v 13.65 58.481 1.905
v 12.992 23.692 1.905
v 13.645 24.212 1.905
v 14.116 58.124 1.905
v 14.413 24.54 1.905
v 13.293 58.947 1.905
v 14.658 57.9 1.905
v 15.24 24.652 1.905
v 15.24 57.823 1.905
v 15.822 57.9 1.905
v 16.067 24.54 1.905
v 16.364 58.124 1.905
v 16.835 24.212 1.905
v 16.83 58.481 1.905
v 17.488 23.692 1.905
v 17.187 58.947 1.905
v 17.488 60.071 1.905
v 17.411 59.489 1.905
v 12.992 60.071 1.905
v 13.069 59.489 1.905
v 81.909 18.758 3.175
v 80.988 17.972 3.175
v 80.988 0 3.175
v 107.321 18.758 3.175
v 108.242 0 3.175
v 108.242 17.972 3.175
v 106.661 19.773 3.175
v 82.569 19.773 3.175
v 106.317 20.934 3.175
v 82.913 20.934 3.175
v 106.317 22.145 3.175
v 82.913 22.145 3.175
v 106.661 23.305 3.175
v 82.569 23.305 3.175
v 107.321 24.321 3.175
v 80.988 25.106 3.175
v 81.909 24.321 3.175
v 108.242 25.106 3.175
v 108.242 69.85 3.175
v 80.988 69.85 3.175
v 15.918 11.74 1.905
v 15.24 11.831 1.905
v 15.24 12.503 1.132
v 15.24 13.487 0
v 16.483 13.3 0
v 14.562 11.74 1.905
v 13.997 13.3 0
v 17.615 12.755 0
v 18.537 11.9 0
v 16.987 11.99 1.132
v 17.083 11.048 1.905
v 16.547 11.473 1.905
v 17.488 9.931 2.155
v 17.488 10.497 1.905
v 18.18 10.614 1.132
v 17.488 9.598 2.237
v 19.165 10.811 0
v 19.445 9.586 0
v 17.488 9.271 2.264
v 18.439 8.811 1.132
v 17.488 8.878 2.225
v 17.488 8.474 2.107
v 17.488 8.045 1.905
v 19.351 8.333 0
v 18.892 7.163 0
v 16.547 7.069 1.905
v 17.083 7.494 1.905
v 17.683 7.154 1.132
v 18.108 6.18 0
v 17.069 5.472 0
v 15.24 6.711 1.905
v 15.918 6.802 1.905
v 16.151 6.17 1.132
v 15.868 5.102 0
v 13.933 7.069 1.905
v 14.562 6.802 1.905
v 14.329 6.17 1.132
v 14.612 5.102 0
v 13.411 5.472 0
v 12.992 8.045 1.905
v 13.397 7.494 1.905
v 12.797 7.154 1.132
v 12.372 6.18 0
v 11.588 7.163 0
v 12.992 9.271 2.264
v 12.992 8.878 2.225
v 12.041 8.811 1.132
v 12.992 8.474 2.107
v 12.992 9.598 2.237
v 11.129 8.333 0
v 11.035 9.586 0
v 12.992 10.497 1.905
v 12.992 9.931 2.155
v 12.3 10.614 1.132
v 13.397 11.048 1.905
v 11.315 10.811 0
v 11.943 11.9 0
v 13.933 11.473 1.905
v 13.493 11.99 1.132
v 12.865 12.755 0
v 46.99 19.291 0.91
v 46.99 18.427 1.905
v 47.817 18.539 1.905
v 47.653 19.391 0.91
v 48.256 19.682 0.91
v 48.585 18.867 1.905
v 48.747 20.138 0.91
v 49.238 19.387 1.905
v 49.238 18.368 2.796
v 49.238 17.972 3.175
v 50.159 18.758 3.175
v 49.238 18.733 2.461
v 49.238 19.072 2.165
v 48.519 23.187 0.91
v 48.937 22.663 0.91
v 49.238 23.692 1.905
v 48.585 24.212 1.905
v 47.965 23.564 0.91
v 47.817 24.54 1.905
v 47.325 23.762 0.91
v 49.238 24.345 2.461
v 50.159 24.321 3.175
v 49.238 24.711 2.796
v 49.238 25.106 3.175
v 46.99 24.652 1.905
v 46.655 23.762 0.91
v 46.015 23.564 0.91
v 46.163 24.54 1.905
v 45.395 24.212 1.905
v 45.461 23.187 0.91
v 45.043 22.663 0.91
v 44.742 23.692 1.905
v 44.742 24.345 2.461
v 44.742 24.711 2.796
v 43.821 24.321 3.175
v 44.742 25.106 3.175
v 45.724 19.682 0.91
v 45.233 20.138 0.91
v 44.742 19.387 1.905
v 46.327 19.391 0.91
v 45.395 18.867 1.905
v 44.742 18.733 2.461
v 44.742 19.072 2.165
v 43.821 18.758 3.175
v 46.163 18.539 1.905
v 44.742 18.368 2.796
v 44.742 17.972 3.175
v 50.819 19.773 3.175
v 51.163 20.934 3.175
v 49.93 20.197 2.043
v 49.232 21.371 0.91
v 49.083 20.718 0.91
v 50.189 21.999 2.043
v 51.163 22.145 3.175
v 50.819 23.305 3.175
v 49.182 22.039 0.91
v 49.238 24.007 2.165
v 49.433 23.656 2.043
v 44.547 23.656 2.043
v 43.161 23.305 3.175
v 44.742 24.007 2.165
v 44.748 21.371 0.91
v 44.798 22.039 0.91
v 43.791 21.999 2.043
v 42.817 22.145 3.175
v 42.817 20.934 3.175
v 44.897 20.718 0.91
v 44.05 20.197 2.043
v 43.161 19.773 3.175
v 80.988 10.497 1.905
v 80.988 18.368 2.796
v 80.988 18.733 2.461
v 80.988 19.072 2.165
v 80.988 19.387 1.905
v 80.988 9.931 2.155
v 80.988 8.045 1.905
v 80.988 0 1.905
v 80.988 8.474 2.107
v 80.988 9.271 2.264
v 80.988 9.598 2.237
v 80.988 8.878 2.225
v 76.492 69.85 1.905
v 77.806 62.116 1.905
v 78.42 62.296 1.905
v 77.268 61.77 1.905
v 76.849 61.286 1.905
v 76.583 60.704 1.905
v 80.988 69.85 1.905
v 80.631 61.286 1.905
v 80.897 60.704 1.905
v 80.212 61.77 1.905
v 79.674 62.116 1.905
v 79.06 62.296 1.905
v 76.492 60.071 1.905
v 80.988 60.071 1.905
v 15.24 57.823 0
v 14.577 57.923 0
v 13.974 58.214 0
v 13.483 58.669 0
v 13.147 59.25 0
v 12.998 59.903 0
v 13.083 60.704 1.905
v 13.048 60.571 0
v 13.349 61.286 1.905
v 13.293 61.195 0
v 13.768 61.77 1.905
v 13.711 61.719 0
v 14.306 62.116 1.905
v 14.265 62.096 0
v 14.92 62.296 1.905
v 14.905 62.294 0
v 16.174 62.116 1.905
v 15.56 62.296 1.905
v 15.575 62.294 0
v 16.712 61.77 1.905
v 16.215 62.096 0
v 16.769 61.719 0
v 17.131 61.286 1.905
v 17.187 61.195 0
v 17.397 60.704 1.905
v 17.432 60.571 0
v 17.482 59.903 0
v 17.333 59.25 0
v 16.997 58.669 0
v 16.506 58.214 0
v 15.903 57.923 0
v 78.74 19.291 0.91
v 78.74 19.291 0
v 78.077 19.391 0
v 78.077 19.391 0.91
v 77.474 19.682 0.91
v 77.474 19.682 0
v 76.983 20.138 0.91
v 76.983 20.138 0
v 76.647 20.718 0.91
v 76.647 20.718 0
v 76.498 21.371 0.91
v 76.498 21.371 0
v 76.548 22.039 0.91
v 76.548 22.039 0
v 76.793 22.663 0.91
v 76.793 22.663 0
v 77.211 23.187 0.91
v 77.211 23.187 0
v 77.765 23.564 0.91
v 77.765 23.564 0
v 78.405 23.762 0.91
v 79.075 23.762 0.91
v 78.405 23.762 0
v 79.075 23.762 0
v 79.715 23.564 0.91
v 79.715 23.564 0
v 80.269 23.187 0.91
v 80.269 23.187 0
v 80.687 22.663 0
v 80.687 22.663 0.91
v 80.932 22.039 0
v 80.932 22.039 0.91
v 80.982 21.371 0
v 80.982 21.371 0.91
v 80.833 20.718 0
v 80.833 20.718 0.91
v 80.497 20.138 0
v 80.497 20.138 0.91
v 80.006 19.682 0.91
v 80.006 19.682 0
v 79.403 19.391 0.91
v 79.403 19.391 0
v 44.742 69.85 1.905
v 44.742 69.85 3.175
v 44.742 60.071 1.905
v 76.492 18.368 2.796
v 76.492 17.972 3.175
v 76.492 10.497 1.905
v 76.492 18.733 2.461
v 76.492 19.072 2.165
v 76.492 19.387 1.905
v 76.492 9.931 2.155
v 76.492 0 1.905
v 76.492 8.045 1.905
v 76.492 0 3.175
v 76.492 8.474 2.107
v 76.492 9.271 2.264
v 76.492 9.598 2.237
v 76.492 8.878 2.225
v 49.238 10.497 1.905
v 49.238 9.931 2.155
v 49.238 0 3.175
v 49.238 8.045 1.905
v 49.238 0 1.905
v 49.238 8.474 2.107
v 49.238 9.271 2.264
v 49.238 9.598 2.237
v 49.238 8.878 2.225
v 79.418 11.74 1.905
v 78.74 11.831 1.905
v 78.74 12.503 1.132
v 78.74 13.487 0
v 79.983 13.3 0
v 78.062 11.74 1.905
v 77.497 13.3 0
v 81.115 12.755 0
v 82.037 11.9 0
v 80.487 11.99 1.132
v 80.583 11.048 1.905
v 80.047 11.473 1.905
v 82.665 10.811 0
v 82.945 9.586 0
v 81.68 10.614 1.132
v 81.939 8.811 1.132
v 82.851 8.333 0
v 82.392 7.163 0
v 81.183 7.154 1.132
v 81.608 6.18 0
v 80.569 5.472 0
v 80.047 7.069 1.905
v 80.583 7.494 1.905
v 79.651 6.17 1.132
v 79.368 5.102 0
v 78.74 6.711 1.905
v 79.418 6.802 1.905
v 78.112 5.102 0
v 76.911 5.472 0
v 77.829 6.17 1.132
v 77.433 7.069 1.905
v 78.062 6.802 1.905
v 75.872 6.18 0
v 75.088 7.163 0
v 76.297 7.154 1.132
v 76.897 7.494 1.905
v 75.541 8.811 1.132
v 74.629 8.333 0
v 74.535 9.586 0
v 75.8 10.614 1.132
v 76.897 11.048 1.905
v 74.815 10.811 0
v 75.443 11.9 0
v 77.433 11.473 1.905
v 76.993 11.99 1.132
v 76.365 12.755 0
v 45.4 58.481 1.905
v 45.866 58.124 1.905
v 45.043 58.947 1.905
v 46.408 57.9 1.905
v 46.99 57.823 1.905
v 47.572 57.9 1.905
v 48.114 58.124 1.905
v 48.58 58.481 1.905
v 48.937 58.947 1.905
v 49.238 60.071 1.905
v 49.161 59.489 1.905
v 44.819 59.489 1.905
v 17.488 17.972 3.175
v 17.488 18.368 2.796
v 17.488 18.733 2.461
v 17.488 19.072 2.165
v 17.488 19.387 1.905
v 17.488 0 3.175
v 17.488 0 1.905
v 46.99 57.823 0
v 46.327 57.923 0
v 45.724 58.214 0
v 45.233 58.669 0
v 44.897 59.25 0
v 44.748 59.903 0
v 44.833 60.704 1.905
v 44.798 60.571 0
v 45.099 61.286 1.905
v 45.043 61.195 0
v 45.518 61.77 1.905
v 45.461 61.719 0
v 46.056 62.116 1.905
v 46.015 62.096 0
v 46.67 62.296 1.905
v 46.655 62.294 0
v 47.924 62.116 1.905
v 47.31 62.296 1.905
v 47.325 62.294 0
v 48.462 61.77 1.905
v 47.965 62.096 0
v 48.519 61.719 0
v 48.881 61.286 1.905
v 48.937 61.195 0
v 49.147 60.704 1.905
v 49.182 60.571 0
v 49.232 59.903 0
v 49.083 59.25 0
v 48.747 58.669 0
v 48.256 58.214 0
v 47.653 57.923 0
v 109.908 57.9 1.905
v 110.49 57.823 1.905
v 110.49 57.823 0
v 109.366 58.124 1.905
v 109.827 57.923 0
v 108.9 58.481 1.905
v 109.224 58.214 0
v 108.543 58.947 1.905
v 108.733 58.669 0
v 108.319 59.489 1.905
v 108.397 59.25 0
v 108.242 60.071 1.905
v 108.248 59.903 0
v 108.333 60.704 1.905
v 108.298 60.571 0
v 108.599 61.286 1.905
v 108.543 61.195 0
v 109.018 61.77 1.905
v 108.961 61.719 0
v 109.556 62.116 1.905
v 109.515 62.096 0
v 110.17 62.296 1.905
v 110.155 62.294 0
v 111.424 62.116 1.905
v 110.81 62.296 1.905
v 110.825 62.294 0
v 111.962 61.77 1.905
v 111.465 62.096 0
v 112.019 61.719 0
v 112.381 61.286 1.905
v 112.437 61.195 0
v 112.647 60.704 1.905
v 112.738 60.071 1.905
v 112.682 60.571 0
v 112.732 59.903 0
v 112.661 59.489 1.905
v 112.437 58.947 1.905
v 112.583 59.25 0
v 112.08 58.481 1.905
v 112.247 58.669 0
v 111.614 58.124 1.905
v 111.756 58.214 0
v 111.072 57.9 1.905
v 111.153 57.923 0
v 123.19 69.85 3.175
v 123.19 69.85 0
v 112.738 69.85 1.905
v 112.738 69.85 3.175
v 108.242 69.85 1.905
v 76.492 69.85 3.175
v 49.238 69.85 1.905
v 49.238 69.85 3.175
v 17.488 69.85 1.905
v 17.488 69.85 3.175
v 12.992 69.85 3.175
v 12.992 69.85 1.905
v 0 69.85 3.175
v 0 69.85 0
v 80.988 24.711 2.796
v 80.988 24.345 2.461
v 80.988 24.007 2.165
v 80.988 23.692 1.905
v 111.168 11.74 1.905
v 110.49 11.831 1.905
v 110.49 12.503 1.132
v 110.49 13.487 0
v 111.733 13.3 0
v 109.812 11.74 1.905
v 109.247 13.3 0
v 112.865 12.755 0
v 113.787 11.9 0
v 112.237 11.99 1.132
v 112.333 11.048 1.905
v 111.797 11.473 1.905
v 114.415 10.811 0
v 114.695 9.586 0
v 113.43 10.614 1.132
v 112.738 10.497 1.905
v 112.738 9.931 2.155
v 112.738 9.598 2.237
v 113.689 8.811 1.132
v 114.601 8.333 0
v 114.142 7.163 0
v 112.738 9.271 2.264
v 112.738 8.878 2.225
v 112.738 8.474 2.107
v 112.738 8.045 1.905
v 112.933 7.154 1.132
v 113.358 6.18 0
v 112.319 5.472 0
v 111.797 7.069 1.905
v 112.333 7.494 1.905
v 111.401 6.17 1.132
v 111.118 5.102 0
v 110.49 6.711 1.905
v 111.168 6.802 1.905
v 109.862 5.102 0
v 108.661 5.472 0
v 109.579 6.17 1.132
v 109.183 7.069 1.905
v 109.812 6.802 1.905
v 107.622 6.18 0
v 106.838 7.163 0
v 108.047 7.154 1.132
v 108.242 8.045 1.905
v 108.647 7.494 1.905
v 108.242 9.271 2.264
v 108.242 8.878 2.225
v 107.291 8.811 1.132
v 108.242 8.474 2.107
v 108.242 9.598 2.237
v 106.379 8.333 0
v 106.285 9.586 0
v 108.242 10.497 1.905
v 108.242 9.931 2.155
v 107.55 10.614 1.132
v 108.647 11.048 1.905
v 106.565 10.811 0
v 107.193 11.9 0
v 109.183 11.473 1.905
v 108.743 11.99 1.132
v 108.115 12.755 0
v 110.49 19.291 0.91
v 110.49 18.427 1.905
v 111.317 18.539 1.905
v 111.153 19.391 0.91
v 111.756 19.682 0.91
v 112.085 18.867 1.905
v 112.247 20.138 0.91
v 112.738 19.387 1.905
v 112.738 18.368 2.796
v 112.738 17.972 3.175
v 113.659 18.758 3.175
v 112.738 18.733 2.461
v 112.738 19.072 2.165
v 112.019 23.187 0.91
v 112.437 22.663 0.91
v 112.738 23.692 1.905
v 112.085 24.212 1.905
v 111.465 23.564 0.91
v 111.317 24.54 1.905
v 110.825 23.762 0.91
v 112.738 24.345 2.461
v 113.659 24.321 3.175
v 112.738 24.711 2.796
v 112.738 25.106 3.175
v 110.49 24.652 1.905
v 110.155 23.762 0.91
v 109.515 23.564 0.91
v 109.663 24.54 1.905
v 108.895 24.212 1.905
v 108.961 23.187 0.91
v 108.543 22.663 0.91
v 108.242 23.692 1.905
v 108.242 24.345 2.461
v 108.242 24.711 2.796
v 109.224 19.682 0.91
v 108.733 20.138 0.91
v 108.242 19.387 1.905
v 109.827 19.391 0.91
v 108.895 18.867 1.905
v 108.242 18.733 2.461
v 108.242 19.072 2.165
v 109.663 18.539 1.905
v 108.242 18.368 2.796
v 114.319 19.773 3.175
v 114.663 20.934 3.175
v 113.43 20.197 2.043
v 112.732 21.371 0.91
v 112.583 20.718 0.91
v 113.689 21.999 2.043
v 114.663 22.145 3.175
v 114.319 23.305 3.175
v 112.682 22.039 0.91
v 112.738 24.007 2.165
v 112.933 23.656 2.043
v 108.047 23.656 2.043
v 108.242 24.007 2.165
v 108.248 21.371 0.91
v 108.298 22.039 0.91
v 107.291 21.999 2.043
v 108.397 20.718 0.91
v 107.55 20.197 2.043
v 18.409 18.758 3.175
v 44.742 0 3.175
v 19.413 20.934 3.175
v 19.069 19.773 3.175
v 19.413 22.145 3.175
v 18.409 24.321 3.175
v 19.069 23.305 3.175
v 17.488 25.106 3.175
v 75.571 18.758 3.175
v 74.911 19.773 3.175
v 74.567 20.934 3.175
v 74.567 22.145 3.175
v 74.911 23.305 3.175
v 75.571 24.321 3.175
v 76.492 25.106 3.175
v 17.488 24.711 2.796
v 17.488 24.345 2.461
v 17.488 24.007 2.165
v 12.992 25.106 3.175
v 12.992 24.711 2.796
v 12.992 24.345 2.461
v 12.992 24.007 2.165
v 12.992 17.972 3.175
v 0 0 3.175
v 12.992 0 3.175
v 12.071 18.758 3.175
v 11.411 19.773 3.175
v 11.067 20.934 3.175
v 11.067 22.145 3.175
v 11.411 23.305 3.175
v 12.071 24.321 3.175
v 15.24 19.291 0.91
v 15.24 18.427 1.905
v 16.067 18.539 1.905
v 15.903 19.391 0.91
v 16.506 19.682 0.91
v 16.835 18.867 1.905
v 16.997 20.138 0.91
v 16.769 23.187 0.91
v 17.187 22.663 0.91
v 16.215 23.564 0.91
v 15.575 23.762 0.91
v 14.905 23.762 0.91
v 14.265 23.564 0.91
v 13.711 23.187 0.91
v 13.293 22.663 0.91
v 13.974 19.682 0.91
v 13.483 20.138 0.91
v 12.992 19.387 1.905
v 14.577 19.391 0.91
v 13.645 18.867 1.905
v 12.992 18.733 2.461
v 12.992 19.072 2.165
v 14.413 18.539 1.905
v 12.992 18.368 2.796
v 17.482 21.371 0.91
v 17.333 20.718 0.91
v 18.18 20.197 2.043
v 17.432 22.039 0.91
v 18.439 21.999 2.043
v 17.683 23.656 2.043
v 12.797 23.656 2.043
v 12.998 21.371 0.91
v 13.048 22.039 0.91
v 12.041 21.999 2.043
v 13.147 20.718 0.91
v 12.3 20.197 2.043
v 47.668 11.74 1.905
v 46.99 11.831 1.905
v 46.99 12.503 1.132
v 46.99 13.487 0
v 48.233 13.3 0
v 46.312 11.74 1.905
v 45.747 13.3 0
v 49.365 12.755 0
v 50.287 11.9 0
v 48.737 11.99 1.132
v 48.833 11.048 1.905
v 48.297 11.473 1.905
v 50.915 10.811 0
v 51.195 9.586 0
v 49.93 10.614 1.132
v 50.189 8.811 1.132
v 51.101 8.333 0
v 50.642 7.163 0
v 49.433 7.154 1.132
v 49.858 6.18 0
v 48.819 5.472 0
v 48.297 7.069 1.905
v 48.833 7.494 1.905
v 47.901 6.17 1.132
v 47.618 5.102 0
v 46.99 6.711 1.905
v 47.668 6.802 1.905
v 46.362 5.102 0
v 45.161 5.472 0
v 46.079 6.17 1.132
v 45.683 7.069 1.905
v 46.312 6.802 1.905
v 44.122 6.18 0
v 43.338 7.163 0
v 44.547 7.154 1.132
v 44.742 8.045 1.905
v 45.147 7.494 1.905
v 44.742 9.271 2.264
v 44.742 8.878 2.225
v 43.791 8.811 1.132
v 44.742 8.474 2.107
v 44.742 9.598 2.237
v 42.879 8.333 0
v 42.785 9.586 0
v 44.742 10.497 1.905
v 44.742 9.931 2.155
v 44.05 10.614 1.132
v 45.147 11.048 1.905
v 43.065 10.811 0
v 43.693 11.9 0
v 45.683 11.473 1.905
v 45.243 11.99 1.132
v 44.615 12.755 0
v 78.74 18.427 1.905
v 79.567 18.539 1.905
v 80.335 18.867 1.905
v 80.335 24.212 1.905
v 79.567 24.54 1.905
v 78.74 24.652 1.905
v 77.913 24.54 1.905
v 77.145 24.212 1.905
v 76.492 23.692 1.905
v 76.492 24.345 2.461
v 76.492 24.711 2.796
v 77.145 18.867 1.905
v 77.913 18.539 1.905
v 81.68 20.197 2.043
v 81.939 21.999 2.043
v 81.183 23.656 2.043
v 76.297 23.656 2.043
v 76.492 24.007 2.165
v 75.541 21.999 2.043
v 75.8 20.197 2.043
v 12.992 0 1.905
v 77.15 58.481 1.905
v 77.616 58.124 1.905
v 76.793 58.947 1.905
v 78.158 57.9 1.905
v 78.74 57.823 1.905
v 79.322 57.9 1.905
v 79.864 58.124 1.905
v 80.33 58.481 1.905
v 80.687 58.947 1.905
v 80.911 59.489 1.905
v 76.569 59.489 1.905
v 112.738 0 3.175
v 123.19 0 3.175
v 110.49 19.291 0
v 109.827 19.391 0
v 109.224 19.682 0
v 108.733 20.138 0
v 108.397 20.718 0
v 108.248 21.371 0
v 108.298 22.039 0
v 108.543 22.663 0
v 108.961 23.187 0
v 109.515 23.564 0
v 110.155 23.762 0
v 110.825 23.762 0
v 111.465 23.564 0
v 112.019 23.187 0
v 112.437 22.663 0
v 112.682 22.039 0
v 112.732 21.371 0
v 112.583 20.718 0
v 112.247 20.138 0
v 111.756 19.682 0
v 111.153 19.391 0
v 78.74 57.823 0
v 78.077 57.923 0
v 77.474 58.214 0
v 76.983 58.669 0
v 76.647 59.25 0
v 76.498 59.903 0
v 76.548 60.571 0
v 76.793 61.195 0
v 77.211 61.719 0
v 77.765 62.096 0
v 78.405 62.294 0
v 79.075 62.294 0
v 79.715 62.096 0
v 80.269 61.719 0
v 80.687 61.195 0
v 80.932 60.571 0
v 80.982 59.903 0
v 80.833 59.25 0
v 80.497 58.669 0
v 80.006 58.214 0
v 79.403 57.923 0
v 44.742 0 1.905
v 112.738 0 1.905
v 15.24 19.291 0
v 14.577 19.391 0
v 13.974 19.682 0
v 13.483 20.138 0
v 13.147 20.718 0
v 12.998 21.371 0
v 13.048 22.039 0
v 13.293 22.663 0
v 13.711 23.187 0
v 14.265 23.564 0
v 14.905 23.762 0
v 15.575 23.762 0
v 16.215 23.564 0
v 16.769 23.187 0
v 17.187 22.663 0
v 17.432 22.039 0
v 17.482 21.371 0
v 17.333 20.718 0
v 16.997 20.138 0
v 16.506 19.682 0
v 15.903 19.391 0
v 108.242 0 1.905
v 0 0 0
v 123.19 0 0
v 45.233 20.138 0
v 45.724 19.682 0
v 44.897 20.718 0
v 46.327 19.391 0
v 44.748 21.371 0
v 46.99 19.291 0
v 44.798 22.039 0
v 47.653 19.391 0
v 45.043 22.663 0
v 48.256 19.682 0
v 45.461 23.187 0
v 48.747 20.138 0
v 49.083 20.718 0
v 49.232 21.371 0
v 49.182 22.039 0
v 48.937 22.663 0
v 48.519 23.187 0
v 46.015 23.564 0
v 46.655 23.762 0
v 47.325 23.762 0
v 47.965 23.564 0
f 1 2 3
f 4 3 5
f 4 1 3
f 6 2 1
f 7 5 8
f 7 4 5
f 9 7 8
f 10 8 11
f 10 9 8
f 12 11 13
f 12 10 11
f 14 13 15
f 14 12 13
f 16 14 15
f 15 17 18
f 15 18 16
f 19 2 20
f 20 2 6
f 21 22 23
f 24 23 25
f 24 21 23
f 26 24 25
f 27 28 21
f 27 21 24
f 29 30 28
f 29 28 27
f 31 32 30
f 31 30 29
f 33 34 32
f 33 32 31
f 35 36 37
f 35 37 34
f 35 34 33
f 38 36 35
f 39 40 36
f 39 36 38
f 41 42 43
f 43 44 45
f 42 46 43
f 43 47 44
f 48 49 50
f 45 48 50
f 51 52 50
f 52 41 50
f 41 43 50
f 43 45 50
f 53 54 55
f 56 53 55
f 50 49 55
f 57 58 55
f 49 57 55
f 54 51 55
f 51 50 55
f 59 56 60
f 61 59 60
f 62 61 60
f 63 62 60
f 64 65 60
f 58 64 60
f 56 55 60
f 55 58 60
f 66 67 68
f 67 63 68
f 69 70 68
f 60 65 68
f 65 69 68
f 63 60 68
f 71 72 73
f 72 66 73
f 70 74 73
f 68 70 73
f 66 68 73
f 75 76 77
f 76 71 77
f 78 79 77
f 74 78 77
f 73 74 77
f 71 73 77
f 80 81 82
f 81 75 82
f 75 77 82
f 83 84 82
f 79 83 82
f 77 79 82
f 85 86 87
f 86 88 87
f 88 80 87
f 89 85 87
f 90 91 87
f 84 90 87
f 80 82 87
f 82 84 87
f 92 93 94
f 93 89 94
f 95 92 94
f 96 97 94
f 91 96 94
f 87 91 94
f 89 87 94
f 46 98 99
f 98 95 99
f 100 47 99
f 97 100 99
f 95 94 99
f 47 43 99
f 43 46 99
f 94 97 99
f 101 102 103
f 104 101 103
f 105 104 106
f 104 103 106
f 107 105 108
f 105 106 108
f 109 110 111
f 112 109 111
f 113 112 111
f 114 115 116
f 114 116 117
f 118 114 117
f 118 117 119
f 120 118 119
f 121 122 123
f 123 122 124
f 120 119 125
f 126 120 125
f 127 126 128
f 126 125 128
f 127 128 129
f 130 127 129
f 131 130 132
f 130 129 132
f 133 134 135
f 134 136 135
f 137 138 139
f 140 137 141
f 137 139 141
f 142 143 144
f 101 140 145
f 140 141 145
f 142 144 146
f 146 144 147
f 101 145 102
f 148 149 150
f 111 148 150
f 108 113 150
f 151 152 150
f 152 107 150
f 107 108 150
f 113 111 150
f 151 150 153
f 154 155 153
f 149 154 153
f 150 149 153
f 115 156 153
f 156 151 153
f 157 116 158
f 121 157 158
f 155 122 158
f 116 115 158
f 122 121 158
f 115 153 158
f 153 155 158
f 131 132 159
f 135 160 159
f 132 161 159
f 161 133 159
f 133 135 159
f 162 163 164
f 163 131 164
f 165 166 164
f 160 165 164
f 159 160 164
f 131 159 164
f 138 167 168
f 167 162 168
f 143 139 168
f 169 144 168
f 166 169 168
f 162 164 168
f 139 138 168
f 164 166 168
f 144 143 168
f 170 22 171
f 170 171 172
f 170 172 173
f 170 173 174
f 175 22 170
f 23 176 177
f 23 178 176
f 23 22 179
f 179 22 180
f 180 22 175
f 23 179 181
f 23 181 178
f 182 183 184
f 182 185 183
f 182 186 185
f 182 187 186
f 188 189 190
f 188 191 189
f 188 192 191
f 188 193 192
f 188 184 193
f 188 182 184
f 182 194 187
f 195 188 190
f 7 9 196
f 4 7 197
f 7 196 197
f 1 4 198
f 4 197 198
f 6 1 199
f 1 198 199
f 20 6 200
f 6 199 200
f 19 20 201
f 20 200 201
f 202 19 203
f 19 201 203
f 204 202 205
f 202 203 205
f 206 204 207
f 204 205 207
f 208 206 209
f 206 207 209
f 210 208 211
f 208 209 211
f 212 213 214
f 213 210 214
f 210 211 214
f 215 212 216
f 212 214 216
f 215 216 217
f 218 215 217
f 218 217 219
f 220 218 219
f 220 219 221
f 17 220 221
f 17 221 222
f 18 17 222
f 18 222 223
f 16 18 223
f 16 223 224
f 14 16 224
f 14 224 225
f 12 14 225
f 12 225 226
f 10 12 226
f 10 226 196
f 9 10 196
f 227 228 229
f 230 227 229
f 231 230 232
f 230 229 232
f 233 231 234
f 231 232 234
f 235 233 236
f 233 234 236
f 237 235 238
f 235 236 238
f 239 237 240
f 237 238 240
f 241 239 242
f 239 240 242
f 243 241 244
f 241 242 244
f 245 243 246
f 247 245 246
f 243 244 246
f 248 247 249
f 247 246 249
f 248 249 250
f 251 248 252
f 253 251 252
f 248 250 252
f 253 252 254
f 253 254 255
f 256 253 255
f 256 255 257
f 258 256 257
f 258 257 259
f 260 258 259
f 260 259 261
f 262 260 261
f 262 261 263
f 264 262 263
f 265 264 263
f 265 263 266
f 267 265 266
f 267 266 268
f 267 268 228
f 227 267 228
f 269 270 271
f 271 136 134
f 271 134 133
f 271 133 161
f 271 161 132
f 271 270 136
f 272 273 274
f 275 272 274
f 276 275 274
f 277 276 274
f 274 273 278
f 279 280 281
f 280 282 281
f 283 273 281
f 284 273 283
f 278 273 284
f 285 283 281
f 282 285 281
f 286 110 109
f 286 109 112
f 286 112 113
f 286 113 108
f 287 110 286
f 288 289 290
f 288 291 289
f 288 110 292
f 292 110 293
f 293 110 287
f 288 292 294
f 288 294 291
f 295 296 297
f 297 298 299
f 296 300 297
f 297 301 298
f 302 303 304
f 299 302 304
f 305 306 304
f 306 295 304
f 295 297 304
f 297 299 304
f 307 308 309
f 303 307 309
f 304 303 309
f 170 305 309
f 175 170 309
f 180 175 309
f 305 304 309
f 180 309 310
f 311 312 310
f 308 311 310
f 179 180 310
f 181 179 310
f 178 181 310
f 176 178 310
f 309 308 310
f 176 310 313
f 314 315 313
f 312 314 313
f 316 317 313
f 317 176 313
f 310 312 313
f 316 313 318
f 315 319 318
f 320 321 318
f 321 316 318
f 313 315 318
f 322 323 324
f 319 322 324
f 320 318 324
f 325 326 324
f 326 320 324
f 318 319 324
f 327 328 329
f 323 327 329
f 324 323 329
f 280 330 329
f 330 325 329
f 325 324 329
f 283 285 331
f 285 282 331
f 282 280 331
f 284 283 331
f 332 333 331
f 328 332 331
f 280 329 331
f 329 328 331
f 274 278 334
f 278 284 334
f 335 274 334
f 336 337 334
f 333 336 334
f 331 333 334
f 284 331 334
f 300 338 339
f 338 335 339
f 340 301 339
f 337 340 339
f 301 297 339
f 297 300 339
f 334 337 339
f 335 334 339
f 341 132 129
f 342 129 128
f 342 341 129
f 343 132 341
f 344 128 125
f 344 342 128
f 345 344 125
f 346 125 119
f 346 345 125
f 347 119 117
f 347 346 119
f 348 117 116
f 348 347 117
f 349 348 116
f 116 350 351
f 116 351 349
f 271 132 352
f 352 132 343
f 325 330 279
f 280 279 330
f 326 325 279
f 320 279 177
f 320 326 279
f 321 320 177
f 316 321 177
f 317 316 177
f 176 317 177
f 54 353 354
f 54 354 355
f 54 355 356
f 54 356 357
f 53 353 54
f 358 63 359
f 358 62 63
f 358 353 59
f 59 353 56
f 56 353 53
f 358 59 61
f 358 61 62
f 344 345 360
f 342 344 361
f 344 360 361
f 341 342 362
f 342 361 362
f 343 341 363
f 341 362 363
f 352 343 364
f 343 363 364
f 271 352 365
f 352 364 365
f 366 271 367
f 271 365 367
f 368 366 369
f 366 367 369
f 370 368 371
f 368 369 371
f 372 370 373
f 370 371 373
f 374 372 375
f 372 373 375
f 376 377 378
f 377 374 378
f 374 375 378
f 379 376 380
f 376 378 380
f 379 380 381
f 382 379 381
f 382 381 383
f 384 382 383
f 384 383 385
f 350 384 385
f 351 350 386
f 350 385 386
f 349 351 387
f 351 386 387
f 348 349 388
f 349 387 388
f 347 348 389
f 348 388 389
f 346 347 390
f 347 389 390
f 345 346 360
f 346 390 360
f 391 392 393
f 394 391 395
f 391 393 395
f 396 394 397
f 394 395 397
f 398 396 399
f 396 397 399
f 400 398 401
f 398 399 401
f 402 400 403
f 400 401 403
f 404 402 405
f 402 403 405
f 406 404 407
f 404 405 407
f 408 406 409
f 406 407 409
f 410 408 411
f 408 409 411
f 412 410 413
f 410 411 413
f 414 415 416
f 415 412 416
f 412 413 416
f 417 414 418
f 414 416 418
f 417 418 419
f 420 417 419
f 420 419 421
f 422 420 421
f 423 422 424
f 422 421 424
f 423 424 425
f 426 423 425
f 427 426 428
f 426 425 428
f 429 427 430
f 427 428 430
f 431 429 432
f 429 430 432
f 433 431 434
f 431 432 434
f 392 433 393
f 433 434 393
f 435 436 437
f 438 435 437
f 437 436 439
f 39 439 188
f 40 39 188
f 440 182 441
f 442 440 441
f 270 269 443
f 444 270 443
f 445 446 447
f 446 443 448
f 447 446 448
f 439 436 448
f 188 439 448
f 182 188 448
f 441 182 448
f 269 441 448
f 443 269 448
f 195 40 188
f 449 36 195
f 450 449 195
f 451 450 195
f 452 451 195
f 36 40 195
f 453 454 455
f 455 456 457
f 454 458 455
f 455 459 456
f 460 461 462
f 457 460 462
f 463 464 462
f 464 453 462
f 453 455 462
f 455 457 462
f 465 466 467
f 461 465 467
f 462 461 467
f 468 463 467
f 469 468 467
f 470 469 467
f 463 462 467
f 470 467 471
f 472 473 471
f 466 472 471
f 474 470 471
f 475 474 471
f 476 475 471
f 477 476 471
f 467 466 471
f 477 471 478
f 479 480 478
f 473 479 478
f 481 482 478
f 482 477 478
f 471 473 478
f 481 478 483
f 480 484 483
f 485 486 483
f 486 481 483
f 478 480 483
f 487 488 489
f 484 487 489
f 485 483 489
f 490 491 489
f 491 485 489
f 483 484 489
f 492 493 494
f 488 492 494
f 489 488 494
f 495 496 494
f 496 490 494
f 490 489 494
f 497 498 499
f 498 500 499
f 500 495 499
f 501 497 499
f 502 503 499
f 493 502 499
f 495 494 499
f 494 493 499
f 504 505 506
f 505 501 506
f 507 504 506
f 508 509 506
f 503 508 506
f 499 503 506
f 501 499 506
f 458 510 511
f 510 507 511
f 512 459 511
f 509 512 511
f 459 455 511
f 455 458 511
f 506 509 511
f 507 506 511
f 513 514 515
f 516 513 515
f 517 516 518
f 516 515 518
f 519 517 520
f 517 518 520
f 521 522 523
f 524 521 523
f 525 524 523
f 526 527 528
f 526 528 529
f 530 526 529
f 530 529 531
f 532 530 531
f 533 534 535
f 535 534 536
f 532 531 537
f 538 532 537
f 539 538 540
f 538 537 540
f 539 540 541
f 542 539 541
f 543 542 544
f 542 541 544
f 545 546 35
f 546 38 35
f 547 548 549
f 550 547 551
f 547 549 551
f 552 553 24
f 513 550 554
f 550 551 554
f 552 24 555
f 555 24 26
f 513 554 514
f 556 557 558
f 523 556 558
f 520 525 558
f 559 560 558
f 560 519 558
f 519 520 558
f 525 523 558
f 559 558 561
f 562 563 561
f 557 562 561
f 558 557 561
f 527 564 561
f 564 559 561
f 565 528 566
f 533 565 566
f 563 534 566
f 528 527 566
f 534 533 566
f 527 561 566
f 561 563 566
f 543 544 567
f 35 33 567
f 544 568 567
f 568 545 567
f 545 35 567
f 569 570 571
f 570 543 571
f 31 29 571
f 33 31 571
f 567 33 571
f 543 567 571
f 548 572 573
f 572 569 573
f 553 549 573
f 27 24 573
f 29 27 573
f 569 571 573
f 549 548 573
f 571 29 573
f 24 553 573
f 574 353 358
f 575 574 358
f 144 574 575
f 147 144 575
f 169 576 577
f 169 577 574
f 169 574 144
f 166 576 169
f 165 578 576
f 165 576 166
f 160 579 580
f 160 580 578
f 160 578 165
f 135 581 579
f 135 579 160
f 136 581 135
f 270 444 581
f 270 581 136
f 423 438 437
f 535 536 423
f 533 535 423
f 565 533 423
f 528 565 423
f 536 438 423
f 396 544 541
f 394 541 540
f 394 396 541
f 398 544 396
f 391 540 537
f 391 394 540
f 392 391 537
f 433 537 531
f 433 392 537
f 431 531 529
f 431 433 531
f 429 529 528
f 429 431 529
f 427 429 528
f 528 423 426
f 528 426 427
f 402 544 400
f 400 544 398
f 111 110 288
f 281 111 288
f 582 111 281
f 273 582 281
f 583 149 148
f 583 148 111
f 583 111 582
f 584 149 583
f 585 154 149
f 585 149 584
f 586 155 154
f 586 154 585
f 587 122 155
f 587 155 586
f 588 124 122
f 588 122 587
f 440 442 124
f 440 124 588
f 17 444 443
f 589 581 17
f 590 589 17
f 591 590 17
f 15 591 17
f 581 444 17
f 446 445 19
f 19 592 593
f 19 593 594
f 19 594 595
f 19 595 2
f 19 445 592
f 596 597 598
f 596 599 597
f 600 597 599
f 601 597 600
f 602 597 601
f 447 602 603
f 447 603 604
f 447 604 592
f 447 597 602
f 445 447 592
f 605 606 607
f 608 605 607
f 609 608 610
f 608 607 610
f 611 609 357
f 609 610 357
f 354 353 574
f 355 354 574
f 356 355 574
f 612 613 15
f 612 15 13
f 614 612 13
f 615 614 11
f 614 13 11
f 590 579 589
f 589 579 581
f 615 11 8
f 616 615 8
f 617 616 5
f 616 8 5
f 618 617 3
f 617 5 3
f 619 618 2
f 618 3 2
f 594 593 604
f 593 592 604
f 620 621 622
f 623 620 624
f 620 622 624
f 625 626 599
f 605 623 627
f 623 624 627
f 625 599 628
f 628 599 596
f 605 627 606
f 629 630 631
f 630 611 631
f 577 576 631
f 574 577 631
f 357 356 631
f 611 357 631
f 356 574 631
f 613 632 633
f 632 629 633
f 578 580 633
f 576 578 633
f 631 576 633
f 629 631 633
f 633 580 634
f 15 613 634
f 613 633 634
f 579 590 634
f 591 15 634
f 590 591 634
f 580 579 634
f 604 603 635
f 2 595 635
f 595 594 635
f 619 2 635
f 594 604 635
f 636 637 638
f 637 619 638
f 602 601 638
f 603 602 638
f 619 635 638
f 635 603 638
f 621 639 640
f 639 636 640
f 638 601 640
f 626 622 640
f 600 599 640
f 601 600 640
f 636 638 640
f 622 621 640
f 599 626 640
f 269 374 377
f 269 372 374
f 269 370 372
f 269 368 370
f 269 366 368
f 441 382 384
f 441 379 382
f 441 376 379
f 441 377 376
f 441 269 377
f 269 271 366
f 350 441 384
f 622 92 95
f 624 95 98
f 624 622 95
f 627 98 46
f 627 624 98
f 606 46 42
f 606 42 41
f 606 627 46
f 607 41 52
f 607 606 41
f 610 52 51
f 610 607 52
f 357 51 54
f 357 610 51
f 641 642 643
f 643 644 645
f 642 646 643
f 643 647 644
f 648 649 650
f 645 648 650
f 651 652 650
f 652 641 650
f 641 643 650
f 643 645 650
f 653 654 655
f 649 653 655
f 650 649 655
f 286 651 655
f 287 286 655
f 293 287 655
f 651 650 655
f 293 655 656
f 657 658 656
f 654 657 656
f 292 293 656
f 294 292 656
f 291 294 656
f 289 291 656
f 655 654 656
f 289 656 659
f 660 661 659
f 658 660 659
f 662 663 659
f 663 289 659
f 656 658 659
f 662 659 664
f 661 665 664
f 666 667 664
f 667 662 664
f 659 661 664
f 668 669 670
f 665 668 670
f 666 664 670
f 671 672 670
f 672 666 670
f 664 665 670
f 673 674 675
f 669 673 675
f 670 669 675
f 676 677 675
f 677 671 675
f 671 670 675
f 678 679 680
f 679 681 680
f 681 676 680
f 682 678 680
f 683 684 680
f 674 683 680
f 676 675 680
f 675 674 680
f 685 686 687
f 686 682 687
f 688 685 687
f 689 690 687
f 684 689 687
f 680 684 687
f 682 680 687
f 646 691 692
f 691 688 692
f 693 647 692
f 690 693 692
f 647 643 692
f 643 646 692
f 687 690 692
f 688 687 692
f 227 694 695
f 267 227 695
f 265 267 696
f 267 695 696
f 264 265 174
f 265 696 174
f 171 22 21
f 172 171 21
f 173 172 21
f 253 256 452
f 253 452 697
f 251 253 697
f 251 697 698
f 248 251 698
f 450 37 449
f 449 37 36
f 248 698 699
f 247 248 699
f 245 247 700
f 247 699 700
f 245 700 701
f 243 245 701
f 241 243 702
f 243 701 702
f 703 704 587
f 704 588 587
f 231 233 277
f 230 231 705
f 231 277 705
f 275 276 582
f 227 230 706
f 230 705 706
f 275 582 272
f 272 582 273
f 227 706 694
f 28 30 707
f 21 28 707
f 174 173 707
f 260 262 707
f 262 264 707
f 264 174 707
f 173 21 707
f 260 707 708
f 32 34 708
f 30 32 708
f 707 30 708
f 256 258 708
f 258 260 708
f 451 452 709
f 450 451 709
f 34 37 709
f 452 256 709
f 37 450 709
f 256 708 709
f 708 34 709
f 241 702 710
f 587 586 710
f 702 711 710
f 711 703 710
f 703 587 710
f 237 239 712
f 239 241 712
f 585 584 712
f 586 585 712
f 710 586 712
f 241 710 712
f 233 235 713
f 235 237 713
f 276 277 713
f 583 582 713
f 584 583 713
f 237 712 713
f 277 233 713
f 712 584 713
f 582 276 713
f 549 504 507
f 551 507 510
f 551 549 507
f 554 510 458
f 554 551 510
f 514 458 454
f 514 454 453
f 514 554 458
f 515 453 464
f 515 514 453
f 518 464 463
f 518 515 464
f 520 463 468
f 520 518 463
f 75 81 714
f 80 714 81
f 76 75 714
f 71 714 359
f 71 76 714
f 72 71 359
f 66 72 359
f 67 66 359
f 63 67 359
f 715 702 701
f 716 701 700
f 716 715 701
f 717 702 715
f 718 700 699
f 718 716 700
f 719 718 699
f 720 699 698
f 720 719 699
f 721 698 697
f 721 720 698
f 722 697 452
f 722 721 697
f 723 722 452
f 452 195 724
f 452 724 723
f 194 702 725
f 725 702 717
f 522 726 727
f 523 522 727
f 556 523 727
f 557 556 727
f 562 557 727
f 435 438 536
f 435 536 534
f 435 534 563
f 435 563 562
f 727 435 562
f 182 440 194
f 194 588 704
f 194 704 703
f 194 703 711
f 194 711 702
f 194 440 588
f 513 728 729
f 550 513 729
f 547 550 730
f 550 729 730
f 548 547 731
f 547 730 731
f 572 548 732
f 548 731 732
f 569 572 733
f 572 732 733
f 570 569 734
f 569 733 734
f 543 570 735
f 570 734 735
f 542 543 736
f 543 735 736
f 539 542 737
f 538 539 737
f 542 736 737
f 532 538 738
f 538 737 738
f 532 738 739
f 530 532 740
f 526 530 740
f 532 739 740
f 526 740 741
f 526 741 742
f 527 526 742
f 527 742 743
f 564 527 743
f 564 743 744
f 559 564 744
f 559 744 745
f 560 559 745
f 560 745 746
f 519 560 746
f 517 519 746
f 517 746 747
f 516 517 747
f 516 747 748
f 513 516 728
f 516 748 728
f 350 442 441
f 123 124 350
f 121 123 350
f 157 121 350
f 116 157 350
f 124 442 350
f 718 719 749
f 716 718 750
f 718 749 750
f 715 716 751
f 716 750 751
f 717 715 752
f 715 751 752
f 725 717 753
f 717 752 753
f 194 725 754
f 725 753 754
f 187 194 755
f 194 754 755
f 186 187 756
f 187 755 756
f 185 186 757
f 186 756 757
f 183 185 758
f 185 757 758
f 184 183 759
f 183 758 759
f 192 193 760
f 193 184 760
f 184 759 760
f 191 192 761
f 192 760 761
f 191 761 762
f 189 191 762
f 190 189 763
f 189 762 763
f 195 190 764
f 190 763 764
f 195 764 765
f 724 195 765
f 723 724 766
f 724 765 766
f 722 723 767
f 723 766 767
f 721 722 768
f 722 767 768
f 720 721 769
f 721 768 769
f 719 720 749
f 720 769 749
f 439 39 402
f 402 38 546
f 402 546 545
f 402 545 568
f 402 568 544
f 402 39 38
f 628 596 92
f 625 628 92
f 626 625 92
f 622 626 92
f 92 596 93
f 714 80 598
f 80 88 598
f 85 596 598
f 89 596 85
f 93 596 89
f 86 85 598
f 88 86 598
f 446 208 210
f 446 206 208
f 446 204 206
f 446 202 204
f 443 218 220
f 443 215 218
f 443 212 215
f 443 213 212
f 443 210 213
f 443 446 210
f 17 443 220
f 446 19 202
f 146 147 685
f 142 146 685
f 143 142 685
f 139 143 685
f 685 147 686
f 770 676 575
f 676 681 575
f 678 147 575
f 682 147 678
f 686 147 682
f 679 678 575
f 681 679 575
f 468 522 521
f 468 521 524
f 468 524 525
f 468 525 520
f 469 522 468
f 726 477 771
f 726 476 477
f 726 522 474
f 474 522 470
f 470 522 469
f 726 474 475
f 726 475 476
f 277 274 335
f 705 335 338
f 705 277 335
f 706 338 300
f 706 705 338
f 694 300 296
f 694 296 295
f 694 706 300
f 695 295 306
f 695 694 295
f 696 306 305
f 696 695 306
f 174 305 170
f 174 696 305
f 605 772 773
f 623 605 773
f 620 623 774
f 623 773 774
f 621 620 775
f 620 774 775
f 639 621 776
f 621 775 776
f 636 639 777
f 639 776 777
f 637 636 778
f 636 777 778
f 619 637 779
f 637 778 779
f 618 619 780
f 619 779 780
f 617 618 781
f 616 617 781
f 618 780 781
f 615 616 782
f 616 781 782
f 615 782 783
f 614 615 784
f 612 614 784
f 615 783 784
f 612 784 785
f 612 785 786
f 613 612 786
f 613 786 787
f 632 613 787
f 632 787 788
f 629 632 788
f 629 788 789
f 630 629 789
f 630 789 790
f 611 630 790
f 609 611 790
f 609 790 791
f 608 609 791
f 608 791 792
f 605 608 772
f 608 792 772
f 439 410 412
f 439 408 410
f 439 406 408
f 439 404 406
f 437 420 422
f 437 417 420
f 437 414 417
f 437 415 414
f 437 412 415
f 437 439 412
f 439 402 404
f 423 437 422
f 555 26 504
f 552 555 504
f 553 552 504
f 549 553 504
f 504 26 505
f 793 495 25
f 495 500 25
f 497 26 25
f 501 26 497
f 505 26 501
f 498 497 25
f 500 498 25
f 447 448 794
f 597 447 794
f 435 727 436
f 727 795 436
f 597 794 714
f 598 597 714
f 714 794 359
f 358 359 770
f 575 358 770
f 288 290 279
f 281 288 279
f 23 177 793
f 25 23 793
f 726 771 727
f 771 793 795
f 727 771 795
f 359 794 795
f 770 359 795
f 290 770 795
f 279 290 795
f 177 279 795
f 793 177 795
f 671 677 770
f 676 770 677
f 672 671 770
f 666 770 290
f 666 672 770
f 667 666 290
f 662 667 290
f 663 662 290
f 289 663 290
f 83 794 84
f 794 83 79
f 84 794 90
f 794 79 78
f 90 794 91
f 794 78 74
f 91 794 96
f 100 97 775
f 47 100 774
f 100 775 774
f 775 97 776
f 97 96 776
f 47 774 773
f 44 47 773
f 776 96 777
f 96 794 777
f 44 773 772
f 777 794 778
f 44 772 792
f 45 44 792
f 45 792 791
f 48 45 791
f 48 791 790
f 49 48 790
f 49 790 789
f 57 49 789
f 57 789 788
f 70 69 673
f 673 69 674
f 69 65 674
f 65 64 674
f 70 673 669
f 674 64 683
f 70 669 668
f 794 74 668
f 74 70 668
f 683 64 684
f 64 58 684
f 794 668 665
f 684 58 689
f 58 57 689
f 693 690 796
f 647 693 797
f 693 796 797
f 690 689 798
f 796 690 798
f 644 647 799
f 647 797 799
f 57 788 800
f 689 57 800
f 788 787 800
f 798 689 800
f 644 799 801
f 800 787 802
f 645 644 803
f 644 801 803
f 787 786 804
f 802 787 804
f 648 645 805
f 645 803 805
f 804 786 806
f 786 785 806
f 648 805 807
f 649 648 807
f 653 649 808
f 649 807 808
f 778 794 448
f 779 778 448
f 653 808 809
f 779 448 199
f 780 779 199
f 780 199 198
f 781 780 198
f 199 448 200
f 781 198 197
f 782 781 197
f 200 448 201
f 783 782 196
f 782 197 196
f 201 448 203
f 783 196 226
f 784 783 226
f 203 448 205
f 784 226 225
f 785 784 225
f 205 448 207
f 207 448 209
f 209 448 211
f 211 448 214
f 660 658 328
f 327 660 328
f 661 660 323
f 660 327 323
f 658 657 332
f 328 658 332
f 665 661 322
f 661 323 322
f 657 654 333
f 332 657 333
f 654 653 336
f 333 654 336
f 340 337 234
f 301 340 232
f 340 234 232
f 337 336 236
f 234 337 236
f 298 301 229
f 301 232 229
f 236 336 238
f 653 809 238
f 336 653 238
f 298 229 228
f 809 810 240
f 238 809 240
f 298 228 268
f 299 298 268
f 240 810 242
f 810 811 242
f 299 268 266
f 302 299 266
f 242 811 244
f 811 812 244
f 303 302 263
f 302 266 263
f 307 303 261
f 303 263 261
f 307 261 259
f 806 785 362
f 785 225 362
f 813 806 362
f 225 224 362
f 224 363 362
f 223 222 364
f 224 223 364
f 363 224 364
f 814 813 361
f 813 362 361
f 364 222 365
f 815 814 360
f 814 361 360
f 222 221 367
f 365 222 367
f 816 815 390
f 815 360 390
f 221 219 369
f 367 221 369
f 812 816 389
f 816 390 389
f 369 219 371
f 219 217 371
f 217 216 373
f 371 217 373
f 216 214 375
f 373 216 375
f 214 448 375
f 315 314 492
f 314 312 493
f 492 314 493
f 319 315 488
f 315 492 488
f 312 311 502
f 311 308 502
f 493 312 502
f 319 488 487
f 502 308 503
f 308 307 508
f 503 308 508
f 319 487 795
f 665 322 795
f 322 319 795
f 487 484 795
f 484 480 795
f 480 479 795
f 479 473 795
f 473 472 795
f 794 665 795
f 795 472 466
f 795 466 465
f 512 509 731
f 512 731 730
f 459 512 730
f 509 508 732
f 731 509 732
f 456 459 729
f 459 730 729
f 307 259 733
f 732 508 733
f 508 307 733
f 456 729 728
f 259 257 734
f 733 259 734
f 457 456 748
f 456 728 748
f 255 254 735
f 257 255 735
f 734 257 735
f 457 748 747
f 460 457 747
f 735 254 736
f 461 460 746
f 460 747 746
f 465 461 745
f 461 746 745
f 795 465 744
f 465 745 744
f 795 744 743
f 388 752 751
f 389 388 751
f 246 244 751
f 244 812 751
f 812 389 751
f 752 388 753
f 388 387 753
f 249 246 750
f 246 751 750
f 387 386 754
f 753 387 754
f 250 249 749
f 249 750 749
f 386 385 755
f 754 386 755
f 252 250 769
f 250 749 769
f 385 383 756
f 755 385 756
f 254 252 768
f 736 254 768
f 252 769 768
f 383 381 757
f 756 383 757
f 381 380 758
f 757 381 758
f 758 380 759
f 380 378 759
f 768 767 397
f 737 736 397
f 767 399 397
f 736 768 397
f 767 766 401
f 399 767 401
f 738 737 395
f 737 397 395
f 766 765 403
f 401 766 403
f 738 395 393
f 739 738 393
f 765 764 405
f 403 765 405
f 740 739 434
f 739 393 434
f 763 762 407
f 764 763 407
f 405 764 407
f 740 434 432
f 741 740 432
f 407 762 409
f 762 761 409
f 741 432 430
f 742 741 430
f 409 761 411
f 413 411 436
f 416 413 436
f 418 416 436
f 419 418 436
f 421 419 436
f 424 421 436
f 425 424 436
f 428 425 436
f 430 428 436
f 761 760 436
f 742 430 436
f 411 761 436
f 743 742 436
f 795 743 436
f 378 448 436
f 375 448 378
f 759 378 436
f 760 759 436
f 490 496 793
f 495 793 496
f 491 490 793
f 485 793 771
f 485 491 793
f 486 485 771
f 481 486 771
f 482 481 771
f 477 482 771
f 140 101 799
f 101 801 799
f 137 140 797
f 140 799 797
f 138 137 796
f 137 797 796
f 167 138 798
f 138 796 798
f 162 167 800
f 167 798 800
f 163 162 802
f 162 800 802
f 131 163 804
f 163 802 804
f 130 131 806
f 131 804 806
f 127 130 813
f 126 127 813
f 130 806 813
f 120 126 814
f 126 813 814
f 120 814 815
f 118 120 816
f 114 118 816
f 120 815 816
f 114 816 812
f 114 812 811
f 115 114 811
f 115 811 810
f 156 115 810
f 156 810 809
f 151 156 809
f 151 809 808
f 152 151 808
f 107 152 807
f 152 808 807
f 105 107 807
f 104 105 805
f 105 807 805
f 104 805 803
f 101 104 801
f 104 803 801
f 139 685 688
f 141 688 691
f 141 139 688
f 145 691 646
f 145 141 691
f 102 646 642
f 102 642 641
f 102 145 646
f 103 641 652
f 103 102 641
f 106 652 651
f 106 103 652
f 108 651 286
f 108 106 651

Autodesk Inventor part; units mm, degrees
ref_plane "YZ Plane" through (0, 0, 0) normal (1, 0, 0) x (0, 1, 0)
ref_plane "XZ Plane" through (0, 0, 0) normal (0, 1, 0) x (-1, 0, 0)
ref_plane "XY Plane" through (0, 0, 0) normal (0, 0, 1) x (1, 0, 0)
sketch "Sketch1" plane through (0, 0, 0) normal (0, 0, 1) x (1, 0, 0)
  line L0 (0, 0) -> (123.19, 0)
  line L1 (123.19, 0) -> (123.19, 69.85)
  line L2 (123.19, 69.85) -> (0, 69.85)
  line L3 (0, 69.85) -> (0, 0)
  dimension "d0" = 69.85
  dimension "d1" = 123.19
extrude "Extrusion1" add sketch "Sketch1" along normal blind 3.175
sketch "Sketch2" plane through (0, 0, 3.175) normal (0, 0, 1) x (1, 0, 0)
  line L0 (123.19, 69.85) -> (0, 69.85) projected
  line L1 (0, 69.85) -> (0, 0) projected
  point P0 (15.24, 60.071)
  point P1 (46.99, 60.071)
  point P2 (78.74, 60.071)
  point P3 (110.49, 60.071)
  dimension "d5" = 9.779
  dimension "d6" = 15.24
  dimension "d7" = 31.75
  dimension "d8" = 31.75
  dimension "d9" = 31.75
hole "Hole1" at (15.24, 60.071, 3.175) at (46.99, 60.071, 3.175) at (78.74, 60.071, 3.175) at (110.49, 60.071, 3.175) direction (0, 0, -1) diameter 4.4958 end through all clearance for "Flat Head Machine Screw (82)" size "#8" standard "Ansi Unified Screw Threads"
sketch "Sketch3" plane through (0, 0, 3.175) normal (0, 0, 1) x (1, 0, 0)
  circle A0 centre (110.49, 60.071) radius 2.2479 projected
  circle A1 centre (46.99, 60.071) radius 2.2479 projected
  circle A2 centre (15.24, 60.071) radius 2.2479 projected
  circle A3 centre (78.74, 60.071) radius 2.2479 projected
  line L0 (0, 0) -> (123.19, 0) projected
  line L1 (123.19, 0) -> (123.19, 69.85) projected
  line L2 (123.19, 69.85) -> (0, 69.85) projected
  line L3 (0, 69.85) -> (0, 0) projected
  point P0 (15.24, 21.5392)
  point P1 (46.99, 21.5392)
  point P2 (78.74, 21.5392)
  point P3 (110.49, 21.5392)
hole "Hole2" at (15.24, 21.5392, 3.175) at (46.99, 21.5392, 3.175) at (78.74, 21.5392, 3.175) at (110.49, 21.5392, 3.175) direction (0, 0, -1) diameter 4.4958 end through all countersink diameter 8.4328 countersink angle 82 clearance for "Flat Head Machine Screw (82)" size "#8" standard "Ansi Unified Screw Threads"
sketch "Sketch4" plane through (0, 0, 0) normal (0, 0, -1) x (-1, 0, 0)
  circle A0 centre (-78.74, 21.5392) radius 2.2479 projected
  circle A1 centre (-15.24, 21.5392) radius 2.2479 projected
  circle A2 centre (-46.99, 21.5392) radius 2.2479 projected
  circle A3 centre (-110.49, 21.5392) radius 2.2479 projected
  circle A4 centre (-78.74, 60.071) radius 2.2479 projected
  circle A5 centre (-15.24, 60.071) radius 2.2479 projected
  circle A6 centre (-46.99, 60.071) radius 2.2479 projected
  circle A7 centre (-110.49, 60.071) radius 2.2479 projected
  line L0 (0, 0) -> (-123.19, 0) projected
  line L1 (0, 69.85) -> (0, 0) projected
  line L2 (-123.19, 69.85) -> (0, 69.85) projected
  line L3 (-123.19, 0) -> (-123.19, 69.85) projected
  point P0 (-110.49, 9.271)
  point P1 (-78.74, 9.271)
  point P2 (-46.99, 9.271)
  point P3 (-15.24, 9.271)
  dimension "d26" = 50.8
hole "Hole3" at (110.49, 9.271, 0) at (78.74, 9.271, 0) at (46.99, 9.271, 0) at (15.24, 9.271, 0) direction (0, 0, 1) diameter 4.4958 end through all countersink diameter 8.4328 countersink angle 82 clearance for "Flat Head Machine Screw (82)" size "#8" standard "Ansi Unified Screw Threads"
sketch "Sketch5" plane through (0, 0, 3.175) normal (0, 0, 1) x (1, 0, 0)
  circle A0 centre (46.99, 9.271) radius 2.2479 construction
  circle A1 centre (110.49, 9.271) radius 2.2479 construction
  circle A2 centre (78.74, 9.271) radius 2.2479 construction
  circle A3 centre (15.24, 9.271) radius 2.2479 construction
  circle A4 centre (78.74, 21.5392) radius 4.2164 construction
  circle A5 centre (15.24, 21.5392) radius 4.2164 construction
  circle A6 centre (46.99, 21.5392) radius 4.2164 construction
  circle A7 centre (110.49, 21.5392) radius 4.2164 construction
  circle A8 centre (78.74, 60.071) radius 2.2479 construction
  circle A9 centre (15.24, 60.071) radius 2.2479 construction
  circle A10 centre (46.99, 60.071) radius 2.2479 construction
  circle A11 centre (110.49, 60.071) radius 2.2479 construction
  line L0 (0, 0) -> (123.19, 0) construction
  line L1 (123.19, 0) -> (123.19, 69.85) construction
  line L2 (123.19, 69.85) -> (0, 69.85) construction
  line L3 (0, 69.85) -> (0, 0) construction
  circle A12 centre (15.24, 21.5392) radius 2.2479 projected
  line L4 (12.9921, 69.85) -> (12.9921, 0)
  line L5 (17.4879, 69.85) -> (17.4879, 0)
  line L6 (12.9921, 69.85) -> (17.4879, 69.85)
  line L7 (12.9921, 0) -> (17.4879, 0)
  line L8 (0, 0) -> (123.19, 0) projected
  circle A13 centre (15.24, 60.071) radius 2.2479 projected
extrude "Extrusion2" cut sketch "Sketch5" against normal blind 1.27 contours L5 L7 L4 A12 | A12 L4 A13 L5 | A13 L4 L6 L5
pattern_linear "Rectangular Pattern1" count 4 spacing 31.75 along (1, 0, 0) of "Extrusion2"
equation "\"d8\" = d7"
equation "\"d9\" = d7"
properties part number "talon stack zip tie mount" material "ABS Plastic"
